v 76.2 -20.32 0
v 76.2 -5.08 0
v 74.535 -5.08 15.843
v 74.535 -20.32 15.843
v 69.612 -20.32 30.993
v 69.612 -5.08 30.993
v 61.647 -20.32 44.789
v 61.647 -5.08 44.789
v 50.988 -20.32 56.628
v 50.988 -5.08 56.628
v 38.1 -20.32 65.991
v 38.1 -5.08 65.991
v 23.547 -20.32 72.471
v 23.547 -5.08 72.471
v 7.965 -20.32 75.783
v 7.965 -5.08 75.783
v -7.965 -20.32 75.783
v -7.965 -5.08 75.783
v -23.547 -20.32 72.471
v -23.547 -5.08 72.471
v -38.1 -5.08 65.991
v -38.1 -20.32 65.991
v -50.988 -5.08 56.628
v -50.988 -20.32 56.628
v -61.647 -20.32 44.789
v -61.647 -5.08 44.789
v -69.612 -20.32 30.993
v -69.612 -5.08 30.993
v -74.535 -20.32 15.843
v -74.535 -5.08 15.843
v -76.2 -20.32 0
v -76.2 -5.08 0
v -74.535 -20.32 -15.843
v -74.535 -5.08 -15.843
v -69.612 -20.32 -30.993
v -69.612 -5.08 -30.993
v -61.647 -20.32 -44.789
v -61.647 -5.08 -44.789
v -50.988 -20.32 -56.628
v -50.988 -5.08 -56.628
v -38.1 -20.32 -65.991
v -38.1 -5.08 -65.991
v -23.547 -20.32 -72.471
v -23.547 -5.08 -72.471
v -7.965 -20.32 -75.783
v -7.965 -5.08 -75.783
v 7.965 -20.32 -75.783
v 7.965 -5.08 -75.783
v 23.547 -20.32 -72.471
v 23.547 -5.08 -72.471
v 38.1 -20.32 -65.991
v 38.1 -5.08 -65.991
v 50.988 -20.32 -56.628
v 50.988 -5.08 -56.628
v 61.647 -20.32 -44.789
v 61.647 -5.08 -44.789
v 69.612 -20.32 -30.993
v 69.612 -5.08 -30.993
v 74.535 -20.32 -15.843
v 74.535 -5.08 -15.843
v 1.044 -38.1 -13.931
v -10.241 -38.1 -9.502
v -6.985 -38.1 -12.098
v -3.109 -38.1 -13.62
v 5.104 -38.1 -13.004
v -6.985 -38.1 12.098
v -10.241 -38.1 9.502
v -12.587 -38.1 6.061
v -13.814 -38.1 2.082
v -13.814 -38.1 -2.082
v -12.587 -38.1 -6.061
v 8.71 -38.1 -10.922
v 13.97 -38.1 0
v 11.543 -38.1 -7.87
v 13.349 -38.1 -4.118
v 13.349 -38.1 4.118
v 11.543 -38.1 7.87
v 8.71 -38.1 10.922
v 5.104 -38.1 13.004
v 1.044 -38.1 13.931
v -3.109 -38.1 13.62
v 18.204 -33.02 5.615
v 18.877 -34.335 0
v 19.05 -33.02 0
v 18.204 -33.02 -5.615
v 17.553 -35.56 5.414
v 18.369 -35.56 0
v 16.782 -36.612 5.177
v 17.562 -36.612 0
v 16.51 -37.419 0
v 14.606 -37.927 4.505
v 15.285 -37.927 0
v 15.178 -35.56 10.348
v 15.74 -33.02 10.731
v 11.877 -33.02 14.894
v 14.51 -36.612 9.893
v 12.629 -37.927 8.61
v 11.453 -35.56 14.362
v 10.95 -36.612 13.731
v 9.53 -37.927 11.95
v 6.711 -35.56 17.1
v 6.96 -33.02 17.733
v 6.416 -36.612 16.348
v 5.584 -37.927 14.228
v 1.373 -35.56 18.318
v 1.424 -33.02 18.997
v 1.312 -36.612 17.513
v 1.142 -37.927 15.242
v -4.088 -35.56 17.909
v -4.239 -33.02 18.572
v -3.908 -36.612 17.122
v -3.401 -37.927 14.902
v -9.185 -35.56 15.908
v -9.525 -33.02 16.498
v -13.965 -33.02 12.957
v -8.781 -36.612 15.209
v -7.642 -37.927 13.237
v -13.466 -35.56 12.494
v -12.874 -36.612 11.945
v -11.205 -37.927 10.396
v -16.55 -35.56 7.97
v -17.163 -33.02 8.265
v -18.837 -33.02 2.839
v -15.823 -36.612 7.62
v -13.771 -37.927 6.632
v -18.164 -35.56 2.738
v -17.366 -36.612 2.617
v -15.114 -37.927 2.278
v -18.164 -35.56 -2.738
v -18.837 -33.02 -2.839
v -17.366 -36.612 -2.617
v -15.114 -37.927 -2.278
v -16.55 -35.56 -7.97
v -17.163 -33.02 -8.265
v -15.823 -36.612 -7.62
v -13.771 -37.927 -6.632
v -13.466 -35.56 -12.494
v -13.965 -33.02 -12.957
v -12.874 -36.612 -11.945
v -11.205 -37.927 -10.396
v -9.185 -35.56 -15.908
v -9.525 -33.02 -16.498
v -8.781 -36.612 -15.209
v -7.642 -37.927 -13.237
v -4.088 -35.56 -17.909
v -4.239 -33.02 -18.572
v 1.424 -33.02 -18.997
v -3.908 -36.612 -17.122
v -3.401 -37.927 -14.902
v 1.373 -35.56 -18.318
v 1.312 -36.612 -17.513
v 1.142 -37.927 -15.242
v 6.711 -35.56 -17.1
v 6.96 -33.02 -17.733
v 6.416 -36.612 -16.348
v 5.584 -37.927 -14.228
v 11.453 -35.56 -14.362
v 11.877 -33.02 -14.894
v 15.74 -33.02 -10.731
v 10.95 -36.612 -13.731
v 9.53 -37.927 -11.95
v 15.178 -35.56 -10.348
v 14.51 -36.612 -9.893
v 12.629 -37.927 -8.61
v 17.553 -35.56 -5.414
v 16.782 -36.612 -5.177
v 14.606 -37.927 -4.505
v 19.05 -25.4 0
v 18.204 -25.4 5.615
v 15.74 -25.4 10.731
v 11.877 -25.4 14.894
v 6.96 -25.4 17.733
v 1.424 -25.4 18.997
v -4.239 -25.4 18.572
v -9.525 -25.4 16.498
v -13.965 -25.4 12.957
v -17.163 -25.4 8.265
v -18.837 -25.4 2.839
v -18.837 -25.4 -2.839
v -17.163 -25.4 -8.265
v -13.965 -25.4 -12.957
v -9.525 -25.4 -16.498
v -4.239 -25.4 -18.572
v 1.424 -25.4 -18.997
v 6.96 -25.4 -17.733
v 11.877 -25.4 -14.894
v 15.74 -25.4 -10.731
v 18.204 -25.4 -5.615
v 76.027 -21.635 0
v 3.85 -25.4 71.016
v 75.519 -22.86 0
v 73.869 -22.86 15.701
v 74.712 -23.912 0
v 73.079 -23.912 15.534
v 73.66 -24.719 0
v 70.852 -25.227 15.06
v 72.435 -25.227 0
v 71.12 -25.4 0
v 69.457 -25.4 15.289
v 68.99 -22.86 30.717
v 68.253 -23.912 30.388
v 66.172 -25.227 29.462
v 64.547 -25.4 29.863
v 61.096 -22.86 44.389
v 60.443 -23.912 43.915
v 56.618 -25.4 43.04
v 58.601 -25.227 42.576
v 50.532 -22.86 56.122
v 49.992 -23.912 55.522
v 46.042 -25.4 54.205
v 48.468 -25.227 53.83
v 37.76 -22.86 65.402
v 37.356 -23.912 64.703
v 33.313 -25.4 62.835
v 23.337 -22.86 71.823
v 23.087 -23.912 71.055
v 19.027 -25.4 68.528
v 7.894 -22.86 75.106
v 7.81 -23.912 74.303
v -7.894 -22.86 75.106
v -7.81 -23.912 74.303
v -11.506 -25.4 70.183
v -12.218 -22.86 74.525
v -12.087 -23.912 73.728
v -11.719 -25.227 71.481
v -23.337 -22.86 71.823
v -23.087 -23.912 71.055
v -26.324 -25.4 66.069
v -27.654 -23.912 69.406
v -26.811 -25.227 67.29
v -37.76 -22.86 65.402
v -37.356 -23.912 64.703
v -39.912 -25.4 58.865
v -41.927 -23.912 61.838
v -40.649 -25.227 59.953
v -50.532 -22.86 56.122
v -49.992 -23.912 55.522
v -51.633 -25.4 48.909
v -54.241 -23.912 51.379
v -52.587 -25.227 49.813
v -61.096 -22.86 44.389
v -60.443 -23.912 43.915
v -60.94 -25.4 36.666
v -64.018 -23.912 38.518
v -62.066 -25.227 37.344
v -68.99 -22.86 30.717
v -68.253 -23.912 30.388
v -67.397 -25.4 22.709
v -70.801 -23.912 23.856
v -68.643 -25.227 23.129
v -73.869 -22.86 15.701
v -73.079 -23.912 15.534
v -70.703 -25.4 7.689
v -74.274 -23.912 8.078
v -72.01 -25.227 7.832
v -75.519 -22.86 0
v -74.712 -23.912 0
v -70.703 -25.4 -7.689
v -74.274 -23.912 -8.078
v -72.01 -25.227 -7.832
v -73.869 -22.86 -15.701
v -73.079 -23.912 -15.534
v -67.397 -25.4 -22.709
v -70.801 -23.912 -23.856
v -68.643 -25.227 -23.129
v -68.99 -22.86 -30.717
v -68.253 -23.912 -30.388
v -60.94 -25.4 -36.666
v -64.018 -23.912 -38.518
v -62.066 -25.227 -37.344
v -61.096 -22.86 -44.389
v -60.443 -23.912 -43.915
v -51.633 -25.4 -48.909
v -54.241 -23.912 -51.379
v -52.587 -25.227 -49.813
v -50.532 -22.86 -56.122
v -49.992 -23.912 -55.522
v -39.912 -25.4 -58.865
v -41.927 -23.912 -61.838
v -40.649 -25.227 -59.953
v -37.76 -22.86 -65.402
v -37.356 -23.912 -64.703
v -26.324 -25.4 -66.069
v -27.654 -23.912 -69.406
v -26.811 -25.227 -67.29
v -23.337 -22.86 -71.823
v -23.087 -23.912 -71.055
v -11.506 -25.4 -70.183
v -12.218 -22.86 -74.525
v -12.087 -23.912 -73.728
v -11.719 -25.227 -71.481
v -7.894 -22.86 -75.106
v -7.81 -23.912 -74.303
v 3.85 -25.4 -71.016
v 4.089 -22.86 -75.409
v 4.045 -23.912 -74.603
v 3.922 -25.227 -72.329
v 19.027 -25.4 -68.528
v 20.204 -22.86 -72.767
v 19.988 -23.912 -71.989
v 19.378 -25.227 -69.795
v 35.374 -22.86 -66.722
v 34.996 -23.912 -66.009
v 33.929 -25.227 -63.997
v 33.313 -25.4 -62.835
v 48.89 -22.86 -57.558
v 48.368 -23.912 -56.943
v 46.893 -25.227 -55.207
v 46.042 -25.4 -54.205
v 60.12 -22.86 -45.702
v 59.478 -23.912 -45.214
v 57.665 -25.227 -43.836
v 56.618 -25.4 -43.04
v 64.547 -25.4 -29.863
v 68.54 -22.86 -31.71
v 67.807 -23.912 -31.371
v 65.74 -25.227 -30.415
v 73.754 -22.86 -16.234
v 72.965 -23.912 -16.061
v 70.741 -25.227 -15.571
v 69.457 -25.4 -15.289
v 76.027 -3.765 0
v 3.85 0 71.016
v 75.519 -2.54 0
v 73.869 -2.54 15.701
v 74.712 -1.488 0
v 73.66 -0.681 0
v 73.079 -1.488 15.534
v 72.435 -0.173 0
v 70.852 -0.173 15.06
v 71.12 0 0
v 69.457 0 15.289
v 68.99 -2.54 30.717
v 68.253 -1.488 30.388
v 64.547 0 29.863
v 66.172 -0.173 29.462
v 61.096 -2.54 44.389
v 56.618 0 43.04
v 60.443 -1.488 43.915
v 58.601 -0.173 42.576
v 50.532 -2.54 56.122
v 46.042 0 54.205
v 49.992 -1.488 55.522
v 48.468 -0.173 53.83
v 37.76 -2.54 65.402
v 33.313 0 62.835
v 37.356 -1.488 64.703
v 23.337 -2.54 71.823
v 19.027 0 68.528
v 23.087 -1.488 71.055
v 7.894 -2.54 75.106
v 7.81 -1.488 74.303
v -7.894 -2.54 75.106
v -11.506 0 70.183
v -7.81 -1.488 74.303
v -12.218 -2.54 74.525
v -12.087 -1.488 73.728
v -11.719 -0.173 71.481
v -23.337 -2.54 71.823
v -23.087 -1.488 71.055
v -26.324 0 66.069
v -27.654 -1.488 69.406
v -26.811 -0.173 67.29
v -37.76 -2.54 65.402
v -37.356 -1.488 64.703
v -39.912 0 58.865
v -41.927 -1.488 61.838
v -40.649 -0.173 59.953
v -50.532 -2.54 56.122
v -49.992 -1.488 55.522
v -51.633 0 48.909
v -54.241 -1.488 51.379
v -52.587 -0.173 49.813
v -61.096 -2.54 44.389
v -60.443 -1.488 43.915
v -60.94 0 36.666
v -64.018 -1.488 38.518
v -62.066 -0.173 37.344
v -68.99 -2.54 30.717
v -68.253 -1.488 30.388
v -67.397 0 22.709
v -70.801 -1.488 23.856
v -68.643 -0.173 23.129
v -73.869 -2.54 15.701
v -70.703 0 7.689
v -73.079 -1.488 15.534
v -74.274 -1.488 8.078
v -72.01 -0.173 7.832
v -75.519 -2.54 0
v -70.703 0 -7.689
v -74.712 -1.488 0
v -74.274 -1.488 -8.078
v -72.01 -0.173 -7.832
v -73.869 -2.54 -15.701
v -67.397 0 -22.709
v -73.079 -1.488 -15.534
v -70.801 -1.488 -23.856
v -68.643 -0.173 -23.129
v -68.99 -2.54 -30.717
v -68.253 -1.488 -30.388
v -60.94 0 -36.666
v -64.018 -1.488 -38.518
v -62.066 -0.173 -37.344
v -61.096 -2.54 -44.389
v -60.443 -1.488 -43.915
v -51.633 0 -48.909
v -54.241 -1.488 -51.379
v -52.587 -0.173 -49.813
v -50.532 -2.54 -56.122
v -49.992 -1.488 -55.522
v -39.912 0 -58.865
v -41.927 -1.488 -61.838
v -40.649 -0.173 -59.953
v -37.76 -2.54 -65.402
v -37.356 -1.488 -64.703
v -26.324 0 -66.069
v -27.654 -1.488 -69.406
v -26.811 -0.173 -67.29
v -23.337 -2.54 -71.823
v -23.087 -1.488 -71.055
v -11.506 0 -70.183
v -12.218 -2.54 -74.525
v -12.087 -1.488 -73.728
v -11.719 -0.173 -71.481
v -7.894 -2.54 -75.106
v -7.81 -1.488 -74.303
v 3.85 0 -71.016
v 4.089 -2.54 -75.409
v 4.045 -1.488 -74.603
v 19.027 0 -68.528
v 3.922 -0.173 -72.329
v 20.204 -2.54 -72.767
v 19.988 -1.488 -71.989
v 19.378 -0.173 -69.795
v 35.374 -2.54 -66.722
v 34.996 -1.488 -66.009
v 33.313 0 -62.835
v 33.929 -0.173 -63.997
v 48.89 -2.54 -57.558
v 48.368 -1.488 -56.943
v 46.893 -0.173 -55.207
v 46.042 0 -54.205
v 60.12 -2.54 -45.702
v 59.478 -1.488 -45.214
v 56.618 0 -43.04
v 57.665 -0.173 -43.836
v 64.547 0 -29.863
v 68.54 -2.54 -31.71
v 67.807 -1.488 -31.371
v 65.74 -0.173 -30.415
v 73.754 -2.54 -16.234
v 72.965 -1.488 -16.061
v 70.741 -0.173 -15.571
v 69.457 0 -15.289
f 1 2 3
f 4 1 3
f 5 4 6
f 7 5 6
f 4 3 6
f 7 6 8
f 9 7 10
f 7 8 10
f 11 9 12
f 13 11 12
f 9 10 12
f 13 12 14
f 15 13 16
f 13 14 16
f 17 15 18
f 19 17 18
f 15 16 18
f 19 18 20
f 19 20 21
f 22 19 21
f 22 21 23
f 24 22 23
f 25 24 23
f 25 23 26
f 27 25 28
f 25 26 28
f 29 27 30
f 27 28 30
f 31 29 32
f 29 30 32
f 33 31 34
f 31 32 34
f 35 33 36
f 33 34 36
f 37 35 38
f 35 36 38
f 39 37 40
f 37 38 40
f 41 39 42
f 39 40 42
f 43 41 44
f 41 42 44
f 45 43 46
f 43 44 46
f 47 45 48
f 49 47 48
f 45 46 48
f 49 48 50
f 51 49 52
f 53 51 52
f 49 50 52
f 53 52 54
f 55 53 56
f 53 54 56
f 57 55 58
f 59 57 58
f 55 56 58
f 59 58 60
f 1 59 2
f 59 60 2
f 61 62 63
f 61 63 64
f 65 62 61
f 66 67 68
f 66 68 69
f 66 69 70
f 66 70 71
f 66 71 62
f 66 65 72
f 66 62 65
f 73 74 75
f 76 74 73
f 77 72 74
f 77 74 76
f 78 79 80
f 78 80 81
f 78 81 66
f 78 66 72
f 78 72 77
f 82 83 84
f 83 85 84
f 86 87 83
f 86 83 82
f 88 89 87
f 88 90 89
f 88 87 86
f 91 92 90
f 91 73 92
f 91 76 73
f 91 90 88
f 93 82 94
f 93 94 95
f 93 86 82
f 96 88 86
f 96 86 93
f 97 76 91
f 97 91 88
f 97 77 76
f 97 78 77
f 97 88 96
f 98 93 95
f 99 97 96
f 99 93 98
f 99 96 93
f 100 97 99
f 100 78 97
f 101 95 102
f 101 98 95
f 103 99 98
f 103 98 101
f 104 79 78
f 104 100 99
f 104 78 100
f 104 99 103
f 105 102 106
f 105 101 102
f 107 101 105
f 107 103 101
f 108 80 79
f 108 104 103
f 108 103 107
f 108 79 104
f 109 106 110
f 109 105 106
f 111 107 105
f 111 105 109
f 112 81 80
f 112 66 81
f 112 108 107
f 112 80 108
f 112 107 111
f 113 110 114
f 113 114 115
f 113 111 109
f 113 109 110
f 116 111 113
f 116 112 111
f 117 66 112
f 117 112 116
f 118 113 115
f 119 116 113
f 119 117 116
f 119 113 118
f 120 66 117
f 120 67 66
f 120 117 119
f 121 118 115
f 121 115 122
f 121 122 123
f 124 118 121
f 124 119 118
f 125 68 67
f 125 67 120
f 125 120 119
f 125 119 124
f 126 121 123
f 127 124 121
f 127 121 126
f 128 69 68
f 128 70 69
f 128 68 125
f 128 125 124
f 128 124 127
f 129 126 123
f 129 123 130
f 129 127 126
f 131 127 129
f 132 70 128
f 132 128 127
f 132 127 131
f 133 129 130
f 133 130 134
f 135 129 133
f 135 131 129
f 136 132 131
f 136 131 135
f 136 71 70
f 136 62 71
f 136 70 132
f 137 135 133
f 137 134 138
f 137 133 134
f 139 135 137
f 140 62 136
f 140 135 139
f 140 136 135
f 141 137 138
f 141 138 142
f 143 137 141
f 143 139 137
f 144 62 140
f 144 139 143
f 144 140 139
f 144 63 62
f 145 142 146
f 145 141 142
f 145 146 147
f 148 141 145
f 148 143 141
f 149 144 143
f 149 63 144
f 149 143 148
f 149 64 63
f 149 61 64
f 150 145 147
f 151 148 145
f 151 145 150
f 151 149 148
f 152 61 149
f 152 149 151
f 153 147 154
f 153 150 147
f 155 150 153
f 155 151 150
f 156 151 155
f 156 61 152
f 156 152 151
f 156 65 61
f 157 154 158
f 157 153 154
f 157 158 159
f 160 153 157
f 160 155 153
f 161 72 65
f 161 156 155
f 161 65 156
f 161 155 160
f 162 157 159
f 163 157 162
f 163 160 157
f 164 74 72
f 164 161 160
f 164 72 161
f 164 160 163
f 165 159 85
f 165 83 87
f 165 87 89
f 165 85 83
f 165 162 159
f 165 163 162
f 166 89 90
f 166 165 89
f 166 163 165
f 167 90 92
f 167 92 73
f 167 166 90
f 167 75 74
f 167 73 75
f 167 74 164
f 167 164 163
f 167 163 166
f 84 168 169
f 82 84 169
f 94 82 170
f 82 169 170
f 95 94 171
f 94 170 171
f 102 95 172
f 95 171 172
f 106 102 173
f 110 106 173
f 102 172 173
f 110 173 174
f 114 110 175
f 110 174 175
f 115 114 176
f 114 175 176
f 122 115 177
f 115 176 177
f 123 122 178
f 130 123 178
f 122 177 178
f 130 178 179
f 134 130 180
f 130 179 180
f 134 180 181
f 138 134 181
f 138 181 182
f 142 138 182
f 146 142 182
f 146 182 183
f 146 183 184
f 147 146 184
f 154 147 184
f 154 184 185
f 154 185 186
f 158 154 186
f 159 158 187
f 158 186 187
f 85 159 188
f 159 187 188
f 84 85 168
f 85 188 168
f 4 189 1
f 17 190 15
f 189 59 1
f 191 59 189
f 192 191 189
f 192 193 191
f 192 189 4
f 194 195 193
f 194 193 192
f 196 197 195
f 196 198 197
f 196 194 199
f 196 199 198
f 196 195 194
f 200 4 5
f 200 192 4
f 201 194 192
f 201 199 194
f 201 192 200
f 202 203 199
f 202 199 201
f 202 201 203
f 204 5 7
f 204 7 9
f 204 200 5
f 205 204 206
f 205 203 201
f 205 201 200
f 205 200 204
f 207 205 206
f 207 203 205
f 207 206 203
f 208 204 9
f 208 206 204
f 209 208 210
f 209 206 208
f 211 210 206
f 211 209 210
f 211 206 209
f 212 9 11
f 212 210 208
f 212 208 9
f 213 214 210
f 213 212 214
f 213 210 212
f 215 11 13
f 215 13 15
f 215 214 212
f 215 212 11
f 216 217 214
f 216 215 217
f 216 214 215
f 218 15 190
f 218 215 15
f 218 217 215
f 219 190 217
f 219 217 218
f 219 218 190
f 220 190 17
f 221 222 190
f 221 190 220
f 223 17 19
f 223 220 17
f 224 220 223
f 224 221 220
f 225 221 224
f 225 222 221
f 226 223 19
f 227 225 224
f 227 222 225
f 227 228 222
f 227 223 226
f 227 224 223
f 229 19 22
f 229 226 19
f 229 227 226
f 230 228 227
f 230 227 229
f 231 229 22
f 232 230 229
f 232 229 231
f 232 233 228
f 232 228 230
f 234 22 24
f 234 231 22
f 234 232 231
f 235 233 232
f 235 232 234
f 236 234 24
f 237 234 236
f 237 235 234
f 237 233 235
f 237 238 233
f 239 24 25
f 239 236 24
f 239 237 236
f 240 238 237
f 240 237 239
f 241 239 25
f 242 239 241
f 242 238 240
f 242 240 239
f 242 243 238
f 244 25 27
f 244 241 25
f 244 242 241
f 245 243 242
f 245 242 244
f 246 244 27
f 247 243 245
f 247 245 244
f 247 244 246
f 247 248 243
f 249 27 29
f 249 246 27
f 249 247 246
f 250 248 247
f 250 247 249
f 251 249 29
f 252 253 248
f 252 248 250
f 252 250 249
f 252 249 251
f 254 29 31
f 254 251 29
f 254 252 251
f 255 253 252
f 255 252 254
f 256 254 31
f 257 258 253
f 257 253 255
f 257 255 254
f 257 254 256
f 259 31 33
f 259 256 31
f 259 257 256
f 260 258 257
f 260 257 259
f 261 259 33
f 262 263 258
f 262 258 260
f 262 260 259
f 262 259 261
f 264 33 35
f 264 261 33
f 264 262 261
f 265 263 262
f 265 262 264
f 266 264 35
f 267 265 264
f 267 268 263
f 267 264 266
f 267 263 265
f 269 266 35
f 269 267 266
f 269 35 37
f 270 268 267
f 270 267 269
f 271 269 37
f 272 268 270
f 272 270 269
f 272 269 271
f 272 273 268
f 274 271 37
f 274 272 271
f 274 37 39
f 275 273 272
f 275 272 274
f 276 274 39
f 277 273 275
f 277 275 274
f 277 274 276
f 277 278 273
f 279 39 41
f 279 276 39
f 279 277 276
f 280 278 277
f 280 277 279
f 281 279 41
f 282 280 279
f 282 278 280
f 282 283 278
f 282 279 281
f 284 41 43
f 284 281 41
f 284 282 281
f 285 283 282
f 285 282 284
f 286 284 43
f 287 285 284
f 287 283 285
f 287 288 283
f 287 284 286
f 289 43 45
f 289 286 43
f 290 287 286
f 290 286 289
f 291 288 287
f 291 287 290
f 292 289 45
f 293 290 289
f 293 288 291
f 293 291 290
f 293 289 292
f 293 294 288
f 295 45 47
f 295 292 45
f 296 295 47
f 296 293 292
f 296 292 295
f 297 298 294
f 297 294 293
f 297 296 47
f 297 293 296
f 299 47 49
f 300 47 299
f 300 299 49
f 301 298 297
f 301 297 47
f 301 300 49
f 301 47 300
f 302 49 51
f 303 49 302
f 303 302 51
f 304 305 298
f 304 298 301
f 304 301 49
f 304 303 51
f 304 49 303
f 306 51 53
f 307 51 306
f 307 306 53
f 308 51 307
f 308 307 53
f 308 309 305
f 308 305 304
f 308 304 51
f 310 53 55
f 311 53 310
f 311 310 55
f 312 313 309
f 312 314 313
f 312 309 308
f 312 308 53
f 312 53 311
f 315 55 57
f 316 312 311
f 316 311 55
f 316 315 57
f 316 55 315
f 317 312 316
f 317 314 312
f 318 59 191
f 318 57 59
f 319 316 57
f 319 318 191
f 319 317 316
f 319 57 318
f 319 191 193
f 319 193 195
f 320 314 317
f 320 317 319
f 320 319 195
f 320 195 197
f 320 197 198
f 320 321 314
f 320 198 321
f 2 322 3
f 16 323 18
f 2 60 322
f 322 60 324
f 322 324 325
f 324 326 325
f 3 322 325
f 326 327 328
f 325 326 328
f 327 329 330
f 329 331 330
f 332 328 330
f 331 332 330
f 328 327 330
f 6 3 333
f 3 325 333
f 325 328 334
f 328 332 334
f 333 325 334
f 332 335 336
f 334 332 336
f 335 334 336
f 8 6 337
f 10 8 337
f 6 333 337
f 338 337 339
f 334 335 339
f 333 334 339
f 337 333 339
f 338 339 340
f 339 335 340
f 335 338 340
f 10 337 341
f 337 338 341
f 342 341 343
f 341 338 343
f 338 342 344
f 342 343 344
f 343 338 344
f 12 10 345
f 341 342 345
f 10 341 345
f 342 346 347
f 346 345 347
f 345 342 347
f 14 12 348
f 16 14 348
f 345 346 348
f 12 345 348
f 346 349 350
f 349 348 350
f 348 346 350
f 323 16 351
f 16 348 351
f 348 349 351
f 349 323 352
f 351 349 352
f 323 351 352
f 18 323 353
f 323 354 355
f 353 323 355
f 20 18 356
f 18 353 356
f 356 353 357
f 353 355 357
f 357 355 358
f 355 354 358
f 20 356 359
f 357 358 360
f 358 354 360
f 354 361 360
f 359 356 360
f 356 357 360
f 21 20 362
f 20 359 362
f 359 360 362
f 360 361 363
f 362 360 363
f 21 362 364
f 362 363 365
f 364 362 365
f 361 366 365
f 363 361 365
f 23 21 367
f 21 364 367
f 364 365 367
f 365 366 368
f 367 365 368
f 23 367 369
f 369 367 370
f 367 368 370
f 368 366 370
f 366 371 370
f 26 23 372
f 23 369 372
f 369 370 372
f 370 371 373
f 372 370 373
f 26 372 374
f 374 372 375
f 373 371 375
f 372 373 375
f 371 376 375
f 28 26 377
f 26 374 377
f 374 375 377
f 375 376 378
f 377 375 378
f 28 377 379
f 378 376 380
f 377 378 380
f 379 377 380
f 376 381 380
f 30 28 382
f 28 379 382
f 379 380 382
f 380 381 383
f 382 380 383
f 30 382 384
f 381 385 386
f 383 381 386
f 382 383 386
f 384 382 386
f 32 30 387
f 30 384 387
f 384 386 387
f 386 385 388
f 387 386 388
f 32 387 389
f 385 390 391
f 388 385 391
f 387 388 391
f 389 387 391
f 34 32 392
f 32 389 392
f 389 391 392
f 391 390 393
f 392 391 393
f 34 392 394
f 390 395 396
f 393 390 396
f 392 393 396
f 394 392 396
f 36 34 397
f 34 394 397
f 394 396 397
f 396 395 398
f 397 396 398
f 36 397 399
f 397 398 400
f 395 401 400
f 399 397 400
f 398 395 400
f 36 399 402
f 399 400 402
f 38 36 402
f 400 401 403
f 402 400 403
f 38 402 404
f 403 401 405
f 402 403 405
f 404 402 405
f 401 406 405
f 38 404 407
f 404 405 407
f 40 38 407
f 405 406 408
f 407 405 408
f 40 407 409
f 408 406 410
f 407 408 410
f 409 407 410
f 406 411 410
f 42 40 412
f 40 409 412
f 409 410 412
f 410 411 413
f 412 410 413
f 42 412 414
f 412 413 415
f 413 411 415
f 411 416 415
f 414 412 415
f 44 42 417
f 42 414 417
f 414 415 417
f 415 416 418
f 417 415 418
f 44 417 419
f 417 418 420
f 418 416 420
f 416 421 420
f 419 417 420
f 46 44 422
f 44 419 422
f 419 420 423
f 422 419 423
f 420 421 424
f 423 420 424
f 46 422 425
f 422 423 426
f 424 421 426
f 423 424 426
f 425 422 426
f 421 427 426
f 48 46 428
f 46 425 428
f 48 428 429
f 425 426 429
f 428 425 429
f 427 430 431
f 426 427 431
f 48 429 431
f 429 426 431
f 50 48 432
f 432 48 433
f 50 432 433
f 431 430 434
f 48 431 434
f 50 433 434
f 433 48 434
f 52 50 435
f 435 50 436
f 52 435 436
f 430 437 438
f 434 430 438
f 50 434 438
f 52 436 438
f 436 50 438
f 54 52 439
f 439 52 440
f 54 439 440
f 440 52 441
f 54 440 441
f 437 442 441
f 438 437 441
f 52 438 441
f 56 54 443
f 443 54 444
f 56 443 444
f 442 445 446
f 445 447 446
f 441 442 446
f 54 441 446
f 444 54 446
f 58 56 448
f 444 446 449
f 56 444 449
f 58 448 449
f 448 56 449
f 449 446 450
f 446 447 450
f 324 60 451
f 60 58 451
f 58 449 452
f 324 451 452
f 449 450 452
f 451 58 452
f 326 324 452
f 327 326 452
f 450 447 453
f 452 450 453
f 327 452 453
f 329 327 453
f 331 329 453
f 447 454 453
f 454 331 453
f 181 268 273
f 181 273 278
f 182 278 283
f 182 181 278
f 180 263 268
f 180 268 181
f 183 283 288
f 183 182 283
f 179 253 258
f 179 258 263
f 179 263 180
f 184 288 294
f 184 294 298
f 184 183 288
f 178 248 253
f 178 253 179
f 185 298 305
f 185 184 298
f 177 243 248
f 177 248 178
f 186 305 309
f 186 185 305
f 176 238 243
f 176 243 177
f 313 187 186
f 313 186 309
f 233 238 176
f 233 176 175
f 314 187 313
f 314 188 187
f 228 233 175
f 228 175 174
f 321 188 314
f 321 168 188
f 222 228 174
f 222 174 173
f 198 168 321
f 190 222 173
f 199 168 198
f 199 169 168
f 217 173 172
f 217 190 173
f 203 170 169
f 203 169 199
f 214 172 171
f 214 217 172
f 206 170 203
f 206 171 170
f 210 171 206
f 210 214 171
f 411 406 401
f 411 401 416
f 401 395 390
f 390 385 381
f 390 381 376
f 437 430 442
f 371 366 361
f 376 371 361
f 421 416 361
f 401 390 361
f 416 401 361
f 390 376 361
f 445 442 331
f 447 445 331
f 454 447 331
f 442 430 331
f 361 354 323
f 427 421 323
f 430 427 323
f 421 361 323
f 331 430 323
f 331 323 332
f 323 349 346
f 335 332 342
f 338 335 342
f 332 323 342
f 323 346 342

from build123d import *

# Parameters (mm, degrees)
F0_R     = 76.2
F1_DEPTH = 25.4
F3_R     = 5.08
F4_R     = 5.08
F2_R     = 19.05
F5_DEPTH = 12.7
F6_R     = 5.08


with BuildPart() as f1:
    # F0 (on Front) → F1 (new body)
    with BuildSketch(Plane.XZ):
        Circle(F0_R)
    extrude(amount=F1_DEPTH)

    # F3
    f3_edges = [f1.edges().sort_by_distance(p)[0] for p in [
        (-76.2, -25.4, 0),
    ]]
    fillet(f3_edges, radius=F3_R)

    # F4
    f4_edges = [f1.edges().sort_by_distance(p)[0] for p in [
        (76.2, -10.16, 0),
        (-76.2, -20.32, 0),
        (-76.2, 0, 0),
    ]]
    fillet(f4_edges, radius=F4_R)

    # F2 (on face) → F5 (join)
    with BuildSketch(Plane.XZ.offset(25.4)):
        Circle(F2_R)
    extrude(amount=F5_DEPTH)

    # F6
    f6_edges = [f1.edges().sort_by_distance(p)[0] for p in [
        (-19.05, -38.1, 0),
    ]]
    fillet(f6_edges, radius=F6_R)


solid = f1.part
